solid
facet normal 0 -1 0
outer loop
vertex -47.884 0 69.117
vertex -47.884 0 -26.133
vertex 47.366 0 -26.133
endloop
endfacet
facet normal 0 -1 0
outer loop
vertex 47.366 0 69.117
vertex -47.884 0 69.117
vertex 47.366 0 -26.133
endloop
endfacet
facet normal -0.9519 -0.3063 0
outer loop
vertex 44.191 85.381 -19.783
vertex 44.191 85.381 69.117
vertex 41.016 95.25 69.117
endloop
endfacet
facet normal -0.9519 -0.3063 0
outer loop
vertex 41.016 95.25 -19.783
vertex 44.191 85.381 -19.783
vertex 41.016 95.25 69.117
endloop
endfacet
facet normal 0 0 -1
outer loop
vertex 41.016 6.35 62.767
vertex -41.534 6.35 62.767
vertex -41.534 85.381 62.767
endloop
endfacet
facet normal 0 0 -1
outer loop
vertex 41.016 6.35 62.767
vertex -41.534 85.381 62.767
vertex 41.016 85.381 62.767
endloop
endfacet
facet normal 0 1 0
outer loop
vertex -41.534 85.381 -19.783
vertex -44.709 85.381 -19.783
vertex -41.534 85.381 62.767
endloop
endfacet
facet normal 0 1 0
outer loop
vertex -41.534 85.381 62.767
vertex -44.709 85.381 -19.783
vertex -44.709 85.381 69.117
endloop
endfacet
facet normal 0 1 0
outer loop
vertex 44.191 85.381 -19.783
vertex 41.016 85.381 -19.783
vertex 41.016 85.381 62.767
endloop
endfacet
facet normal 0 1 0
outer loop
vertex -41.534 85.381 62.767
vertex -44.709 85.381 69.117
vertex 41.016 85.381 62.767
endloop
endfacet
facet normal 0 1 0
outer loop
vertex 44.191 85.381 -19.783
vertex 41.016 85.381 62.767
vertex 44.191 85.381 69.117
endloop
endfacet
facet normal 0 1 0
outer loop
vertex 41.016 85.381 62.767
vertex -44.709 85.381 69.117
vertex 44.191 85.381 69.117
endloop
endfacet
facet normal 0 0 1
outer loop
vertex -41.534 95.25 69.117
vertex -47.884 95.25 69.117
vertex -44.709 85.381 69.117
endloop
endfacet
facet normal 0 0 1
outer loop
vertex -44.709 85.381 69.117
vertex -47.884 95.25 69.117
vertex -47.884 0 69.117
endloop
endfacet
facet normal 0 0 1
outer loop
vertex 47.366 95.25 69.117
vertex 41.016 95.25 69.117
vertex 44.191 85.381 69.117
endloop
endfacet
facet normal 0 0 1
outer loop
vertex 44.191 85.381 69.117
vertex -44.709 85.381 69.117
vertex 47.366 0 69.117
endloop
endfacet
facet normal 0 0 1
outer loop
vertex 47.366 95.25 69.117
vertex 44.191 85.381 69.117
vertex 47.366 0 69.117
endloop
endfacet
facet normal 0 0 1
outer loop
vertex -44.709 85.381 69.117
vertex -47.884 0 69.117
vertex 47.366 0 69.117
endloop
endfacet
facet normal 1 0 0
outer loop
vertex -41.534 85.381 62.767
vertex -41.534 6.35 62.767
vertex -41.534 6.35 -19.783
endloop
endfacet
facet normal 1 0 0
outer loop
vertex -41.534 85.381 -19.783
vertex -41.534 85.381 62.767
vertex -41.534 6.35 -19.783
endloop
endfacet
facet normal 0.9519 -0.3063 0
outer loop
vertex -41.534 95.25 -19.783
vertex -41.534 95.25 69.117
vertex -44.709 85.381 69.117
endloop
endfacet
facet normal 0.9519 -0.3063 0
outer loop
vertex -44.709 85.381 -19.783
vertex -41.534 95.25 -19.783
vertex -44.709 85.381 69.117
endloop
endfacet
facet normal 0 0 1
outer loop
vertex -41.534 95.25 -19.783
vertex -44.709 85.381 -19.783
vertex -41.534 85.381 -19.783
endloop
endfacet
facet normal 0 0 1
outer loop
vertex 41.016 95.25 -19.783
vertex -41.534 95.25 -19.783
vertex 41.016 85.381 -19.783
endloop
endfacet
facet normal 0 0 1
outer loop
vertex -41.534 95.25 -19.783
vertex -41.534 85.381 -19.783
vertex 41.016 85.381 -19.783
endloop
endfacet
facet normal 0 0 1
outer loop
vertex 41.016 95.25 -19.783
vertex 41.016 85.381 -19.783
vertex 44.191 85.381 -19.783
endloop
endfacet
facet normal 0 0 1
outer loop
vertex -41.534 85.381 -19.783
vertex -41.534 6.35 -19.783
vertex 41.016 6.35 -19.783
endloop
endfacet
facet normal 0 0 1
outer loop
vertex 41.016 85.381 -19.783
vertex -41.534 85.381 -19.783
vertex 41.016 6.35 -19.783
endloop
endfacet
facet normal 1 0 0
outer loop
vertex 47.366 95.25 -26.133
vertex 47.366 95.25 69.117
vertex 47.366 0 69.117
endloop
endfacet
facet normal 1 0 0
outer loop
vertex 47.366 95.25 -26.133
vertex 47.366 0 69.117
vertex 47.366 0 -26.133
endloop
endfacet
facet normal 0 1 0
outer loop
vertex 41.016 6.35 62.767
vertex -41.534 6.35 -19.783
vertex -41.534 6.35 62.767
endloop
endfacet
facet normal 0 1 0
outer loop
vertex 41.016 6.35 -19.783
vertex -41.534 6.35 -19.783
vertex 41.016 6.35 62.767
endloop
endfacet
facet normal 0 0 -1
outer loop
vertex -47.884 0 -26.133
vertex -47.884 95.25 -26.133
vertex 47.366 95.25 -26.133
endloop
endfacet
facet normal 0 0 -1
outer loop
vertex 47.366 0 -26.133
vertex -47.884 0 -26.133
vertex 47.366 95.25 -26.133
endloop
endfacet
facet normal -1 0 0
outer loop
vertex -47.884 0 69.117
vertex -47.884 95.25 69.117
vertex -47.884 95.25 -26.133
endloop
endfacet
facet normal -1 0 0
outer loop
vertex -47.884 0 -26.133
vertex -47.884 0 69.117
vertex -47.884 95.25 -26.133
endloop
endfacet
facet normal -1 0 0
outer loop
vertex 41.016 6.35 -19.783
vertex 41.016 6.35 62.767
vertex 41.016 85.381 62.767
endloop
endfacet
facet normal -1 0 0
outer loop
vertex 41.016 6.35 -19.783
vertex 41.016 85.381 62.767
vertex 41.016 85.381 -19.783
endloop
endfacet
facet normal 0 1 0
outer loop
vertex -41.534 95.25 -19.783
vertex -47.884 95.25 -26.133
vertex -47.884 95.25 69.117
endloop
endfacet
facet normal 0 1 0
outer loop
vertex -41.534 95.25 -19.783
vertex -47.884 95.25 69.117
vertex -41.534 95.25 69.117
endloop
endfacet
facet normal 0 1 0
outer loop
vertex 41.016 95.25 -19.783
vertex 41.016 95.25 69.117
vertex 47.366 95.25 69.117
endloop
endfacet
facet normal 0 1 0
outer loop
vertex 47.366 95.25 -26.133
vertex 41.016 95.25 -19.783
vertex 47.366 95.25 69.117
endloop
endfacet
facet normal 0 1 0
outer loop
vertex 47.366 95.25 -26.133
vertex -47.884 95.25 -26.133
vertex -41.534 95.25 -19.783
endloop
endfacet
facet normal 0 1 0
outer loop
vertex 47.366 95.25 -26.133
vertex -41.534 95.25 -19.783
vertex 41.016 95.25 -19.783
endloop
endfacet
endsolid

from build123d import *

# Parameters (mm, degrees)
SKETCH1_W           = 95.25
SKETCH1_H           = 95.25
BOSS_EXTRUDE1_DEPTH = 95.25
SHELL1_T            = -6.35
CUT_EXTRUDE1_DEPTH  = 88.9


with BuildPart() as part:
    # Sketch1 → Boss-Extrude1 (new body)
    with BuildSketch(Plane(origin=(0, 0, 0), x_dir=(1, 0, 0), z_dir=(0, 1, 0))):
        with Locations((-0.25880421, -21.492307692)):
            Rectangle(SKETCH1_W, SKETCH1_H)
    extrude(amount=BOSS_EXTRUDE1_DEPTH)

    # Shell1
    shell1_openings = [part.faces().sort_by_distance(p)[0] for p in [
        (-0.25880421, 95.25, 21.492307692),
    ]]
    offset(amount=SHELL1_T, openings=shell1_openings, kind=Kind.INTERSECTION)

    # Sketch2 → Cut-Extrude1 (cut)
    with BuildSketch(Plane.XY.offset(69.117307692)):
        Polygon((41.01619579, 95.25), (-41.53380421, 95.25), (-44.70880421, 85.381498792), (44.19119579, 85.381498792), align=None)
    extrude(amount=-CUT_EXTRUDE1_DEPTH, mode=Mode.SUBTRACT)


solid = part.part
